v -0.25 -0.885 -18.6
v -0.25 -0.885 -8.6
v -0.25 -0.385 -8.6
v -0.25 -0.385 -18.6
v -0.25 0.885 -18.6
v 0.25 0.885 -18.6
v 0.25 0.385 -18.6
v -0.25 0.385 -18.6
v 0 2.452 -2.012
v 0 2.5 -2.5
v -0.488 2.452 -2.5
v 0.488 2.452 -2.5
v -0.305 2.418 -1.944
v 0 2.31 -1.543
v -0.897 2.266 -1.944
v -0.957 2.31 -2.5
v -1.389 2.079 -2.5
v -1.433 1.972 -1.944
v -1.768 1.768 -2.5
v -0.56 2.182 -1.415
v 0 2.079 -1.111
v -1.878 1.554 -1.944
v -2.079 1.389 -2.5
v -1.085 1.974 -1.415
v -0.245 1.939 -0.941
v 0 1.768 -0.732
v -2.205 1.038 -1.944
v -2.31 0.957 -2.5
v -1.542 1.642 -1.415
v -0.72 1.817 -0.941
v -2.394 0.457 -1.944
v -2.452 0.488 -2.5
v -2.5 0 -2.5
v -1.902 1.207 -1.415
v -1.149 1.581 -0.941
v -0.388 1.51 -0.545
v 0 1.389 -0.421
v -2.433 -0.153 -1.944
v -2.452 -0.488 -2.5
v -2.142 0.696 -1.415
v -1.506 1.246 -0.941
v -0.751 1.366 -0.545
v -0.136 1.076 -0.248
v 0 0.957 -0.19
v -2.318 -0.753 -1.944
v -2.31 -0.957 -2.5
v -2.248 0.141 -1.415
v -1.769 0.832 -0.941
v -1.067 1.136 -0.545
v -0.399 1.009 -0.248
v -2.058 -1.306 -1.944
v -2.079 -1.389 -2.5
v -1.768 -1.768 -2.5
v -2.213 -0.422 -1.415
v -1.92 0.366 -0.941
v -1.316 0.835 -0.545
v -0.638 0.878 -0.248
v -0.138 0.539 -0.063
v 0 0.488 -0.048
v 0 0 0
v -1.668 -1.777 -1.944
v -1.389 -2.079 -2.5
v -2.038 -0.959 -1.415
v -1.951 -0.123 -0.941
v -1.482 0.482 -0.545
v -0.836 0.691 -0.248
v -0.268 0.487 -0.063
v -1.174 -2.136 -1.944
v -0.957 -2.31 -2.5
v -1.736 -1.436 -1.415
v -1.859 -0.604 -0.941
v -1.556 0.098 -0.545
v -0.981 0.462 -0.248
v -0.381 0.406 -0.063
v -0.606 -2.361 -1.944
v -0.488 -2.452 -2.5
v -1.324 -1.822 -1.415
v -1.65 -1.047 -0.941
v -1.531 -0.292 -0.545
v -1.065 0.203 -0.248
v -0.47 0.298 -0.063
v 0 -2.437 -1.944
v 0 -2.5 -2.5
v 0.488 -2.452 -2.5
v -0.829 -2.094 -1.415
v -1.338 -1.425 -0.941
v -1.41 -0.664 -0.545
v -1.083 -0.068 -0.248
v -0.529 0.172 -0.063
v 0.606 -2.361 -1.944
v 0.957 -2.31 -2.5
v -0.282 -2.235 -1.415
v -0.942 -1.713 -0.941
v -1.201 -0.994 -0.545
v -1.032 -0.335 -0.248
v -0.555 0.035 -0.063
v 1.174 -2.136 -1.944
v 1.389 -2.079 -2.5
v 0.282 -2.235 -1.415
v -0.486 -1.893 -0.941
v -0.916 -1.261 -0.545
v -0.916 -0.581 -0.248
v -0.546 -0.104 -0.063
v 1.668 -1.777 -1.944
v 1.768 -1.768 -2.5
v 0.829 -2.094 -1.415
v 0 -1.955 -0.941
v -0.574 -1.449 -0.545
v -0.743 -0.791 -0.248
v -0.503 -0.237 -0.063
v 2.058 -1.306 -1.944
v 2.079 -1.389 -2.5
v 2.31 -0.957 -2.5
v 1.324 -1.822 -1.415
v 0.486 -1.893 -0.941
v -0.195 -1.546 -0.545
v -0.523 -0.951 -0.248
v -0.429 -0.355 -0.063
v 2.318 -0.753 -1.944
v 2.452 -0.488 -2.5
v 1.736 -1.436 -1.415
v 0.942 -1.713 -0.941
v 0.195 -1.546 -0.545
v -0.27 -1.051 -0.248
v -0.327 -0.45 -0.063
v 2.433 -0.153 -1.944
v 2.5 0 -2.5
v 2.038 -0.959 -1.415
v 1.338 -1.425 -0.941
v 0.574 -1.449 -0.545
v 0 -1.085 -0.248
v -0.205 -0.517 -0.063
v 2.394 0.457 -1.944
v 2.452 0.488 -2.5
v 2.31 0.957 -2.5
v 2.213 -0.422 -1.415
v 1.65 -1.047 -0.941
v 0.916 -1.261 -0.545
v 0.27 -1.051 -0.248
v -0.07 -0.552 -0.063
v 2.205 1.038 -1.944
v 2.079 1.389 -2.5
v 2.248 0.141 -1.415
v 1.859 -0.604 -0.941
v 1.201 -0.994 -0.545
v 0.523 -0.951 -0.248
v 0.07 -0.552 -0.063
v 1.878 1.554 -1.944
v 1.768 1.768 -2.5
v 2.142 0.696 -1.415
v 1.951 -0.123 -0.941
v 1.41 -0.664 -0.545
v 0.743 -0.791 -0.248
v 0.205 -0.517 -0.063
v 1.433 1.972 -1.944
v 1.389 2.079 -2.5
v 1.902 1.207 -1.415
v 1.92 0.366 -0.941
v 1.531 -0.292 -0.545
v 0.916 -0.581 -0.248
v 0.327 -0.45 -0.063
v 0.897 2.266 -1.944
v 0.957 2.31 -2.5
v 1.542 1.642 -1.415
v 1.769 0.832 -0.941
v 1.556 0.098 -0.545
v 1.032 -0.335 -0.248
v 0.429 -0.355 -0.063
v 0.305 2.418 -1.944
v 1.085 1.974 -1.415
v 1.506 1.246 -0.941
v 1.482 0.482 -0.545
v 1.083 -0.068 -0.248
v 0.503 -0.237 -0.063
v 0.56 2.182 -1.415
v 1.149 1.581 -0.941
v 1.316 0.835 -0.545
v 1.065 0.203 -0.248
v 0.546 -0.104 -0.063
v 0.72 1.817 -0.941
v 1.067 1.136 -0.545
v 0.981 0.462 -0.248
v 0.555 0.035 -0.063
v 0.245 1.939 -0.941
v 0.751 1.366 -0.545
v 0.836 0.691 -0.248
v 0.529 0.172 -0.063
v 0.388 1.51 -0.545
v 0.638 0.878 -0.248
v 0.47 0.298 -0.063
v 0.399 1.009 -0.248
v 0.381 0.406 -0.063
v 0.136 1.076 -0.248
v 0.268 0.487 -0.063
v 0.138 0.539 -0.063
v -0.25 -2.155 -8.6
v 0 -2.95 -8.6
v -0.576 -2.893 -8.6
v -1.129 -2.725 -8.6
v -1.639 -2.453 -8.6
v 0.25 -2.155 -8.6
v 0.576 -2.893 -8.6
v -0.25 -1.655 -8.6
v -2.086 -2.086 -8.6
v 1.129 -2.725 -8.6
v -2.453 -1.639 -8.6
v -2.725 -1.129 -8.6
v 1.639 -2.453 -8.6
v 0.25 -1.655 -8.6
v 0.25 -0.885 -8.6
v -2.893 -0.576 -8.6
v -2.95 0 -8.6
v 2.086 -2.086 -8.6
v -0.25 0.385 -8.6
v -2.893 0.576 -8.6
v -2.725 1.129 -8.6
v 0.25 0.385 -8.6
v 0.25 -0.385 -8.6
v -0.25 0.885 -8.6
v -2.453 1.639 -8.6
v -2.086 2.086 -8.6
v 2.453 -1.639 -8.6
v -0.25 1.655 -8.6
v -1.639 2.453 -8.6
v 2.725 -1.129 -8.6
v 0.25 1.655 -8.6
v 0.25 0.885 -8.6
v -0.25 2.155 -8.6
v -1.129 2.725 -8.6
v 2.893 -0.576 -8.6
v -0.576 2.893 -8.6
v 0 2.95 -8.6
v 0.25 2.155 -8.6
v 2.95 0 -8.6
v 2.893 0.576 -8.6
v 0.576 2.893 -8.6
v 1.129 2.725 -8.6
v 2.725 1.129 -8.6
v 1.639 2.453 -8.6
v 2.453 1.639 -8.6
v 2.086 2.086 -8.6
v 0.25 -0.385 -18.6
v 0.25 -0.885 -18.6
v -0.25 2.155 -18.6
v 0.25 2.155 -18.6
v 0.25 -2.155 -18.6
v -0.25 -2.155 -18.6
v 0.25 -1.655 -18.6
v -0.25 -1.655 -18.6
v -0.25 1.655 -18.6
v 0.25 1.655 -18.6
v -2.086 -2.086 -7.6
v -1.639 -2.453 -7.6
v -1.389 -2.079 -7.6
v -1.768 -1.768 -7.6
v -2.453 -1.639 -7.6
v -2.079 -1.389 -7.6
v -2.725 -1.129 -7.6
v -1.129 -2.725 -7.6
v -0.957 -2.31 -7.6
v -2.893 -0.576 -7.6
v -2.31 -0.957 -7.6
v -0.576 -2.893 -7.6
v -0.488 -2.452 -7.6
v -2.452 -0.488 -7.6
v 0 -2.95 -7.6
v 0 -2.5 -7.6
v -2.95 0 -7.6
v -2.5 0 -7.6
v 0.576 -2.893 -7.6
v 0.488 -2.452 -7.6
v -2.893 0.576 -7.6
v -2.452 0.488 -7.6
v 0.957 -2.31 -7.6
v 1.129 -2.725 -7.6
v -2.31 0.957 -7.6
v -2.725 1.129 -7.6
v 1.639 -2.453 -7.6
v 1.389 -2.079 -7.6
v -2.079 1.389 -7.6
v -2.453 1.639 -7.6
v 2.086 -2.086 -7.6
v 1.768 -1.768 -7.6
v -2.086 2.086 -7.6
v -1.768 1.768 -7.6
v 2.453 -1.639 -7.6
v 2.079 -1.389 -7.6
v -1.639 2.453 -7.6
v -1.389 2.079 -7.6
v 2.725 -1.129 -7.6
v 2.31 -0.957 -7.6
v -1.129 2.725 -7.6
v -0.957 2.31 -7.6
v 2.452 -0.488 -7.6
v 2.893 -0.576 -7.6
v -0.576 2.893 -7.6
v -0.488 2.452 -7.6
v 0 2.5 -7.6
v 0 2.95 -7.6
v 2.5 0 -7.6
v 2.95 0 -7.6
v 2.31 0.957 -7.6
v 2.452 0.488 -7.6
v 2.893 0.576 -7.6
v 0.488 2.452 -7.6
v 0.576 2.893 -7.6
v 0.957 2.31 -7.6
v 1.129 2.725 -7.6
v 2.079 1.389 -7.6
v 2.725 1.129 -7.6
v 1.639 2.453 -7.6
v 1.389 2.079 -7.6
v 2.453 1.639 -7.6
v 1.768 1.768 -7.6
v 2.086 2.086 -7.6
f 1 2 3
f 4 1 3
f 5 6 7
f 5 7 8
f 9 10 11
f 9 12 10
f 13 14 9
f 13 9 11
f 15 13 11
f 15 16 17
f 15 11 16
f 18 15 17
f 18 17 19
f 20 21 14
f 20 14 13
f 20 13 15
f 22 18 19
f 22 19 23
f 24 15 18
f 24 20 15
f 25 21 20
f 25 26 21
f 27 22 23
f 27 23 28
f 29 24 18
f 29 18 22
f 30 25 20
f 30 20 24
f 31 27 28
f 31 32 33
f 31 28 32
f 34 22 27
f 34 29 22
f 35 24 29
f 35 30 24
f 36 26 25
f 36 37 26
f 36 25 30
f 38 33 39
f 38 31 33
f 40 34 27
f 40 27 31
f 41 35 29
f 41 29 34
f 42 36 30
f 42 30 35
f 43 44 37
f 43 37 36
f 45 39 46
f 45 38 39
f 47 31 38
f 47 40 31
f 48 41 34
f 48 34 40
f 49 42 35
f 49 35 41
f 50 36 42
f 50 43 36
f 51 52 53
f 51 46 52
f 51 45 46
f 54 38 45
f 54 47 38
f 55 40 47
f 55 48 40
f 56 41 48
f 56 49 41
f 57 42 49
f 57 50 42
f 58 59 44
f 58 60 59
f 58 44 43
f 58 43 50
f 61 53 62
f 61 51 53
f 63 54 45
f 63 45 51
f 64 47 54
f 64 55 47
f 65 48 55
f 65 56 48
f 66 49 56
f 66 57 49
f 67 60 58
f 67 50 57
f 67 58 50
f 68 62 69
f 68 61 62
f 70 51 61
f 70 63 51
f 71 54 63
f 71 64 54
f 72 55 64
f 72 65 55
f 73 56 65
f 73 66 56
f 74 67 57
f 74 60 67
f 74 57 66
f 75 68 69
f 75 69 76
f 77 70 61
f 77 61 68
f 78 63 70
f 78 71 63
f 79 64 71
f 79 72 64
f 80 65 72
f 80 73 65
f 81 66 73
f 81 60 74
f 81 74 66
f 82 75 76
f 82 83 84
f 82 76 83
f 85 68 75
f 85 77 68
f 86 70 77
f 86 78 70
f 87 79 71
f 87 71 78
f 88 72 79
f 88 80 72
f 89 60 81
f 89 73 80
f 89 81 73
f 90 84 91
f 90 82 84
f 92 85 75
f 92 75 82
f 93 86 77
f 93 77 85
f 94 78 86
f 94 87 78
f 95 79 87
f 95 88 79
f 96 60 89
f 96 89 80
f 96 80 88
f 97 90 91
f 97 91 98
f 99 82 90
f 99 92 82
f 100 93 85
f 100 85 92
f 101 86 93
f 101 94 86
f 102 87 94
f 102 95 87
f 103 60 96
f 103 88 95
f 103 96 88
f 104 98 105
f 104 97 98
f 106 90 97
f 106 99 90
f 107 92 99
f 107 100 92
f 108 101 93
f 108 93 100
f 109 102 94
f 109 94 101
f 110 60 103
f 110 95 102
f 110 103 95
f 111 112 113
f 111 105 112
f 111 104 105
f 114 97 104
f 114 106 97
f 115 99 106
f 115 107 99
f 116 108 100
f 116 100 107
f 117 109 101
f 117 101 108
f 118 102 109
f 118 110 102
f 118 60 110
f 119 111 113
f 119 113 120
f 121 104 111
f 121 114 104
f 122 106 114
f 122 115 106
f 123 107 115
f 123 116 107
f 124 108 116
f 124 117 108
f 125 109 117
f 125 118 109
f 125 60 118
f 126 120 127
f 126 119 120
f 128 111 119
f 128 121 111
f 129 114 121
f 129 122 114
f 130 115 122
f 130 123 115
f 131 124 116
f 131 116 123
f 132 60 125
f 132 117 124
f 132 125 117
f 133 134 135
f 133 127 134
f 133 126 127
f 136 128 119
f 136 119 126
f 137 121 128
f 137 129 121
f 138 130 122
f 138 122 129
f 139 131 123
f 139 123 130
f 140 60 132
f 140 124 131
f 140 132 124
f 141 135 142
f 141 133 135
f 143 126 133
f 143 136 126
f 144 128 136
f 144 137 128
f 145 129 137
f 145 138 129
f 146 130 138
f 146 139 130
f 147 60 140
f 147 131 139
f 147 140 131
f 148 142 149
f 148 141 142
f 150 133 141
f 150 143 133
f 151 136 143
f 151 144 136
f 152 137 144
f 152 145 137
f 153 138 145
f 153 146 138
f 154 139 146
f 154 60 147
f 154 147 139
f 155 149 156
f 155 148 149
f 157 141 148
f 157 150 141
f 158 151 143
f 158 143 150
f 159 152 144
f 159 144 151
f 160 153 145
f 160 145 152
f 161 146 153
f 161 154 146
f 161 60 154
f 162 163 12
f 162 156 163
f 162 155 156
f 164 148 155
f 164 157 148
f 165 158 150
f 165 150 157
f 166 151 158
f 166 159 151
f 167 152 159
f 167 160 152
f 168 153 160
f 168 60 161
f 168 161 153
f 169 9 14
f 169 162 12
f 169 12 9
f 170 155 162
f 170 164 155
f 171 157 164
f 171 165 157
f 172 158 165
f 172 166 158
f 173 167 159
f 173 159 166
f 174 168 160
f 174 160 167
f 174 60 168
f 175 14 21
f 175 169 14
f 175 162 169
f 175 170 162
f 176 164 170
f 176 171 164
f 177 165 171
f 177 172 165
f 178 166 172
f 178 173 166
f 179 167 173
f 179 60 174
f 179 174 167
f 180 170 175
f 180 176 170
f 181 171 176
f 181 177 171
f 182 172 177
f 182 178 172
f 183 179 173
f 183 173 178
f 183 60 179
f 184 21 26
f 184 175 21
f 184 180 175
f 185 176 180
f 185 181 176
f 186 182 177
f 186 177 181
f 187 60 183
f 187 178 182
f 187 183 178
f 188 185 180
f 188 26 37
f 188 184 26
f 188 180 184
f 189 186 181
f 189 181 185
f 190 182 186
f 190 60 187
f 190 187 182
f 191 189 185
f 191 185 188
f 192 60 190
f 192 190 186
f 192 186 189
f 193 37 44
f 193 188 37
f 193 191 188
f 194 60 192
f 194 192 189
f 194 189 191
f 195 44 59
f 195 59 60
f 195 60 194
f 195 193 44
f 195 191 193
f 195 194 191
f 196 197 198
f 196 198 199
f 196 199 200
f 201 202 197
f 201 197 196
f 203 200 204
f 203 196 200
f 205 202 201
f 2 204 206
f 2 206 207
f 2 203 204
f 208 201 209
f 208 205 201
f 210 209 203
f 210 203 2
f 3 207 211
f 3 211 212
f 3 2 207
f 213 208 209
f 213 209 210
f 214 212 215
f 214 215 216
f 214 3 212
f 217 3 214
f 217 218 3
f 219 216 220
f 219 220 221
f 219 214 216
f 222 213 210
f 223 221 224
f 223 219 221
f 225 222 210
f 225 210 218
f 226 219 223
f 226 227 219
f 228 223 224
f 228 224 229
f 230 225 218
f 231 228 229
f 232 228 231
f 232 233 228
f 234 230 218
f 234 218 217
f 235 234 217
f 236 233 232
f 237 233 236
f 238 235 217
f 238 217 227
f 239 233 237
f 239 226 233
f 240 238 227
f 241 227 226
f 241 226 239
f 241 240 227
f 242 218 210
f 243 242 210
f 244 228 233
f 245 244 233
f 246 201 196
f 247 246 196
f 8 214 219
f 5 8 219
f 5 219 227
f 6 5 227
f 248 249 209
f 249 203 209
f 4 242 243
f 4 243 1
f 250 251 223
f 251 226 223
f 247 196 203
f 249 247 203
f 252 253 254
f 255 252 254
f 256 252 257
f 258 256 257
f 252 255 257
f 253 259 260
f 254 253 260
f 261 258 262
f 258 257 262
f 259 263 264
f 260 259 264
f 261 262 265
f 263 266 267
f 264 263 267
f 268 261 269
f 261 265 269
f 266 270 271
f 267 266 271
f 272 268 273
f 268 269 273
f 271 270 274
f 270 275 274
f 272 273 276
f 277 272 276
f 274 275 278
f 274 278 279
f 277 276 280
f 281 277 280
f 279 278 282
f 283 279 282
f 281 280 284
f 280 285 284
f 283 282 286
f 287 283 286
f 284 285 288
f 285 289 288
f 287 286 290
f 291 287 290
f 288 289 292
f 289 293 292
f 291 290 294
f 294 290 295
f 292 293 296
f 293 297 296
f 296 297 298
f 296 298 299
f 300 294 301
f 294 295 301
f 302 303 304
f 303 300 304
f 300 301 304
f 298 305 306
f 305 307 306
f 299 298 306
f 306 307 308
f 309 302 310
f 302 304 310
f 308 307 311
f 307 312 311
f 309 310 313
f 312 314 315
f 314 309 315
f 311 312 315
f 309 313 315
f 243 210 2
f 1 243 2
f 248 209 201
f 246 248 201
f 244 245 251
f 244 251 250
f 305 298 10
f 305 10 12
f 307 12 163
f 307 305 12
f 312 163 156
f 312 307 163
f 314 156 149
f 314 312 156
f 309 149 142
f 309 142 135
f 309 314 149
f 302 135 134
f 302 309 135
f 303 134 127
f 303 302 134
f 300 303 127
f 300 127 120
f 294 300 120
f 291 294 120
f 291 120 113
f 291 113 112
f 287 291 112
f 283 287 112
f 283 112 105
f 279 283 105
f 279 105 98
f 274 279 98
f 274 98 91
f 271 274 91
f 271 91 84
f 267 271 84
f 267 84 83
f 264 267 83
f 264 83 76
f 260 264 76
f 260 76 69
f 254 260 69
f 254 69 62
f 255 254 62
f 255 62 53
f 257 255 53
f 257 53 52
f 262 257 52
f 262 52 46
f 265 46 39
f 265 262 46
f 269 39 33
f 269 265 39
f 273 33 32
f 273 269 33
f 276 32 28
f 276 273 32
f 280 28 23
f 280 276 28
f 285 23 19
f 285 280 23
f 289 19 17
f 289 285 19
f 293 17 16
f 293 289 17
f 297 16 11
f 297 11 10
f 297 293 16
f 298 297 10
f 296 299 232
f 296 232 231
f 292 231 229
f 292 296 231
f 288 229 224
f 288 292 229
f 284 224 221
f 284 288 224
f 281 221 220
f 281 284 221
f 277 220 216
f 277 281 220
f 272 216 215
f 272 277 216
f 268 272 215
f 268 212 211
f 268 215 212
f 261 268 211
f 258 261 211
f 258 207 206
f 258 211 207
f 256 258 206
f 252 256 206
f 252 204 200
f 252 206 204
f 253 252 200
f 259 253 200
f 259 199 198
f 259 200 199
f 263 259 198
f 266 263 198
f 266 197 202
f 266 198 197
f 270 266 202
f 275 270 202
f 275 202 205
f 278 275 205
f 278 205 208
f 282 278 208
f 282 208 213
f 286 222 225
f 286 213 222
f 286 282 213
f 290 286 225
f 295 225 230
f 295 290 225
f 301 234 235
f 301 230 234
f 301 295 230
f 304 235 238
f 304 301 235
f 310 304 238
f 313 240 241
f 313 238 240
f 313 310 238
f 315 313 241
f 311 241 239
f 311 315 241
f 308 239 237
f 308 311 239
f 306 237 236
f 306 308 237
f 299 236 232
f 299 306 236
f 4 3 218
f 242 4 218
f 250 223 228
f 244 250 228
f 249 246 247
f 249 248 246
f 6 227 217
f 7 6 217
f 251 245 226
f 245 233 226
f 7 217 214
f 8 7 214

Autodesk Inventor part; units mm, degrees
ref_plane "YZ Plane" through (0, 0, 0) normal (1, 0, 0) x (0, 1, 0)
ref_plane "XZ Plane" through (0, 0, 0) normal (0, 1, 0) x (-1, 0, 0)
ref_plane "XY Plane" through (0, 0, 0) normal (0, 0, 1) x (1, 0, 0)
sketch "스케치1" plane through (0, 0, 0) normal (1, 0, 0) x (0, 1, 0)
  line L0 (0, 0) -> (0, -8.6)
  line L1 (0, -8.6) -> (0, -25.7335)
  arc A0 (2.5, -2.5) -> (0, 0) centre (0, -2.5) ccw
  line L2 (2.5, -2.5) -> (2.5, -7.6)
  line L3 (0, -8.6) -> (2.95, -8.6)
  line L4 (2.95, -8.6) -> (2.95, -7.6)
  line L5 (2.95, -7.6) -> (2.5, -7.6)
  dimension "d0" = 8.6
  dimension "d1" = 17.1335
  dimension "d2" = 5
  dimension "d3" = 1
  dimension "d4" = 2.5
  dimension "d6" = 5.9
revolve "회전1" add sketch "스케치1" angle 360 about axis through (0, 0, -8.6) along (0, 0, -1)
sketch "스케치2" plane through (0, 0, -8.6) normal (0, 0, -1) x (-1, 0, 0)
  line L0 (0.25, -1.655) -> (-0.25, -1.655)
  line L1 (-0.25, -1.655) -> (-0.25, -2.155)
  line L2 (-0.25, -2.155) -> (0.25, -2.155)
  line L3 (0.25, -2.155) -> (0.25, -1.655)
  line L4 (0.25, -1.655) -> (-0.25, -2.155) construction
  line L5 (-0.25, -1.655) -> (0.25, -2.155) construction
  line L6 (0.25, -0.385) -> (-0.25, -0.385)
  line L7 (-0.25, -0.385) -> (-0.25, -0.885)
  line L8 (-0.25, -0.885) -> (0.25, -0.885)
  line L9 (0.25, -0.885) -> (0.25, -0.385)
  line L10 (0.25, -0.385) -> (-0.25, -0.885) construction
  line L11 (-0.25, -0.385) -> (0.25, -0.885) construction
  line L12 (0.25, 0.885) -> (-0.25, 0.885)
  line L13 (-0.25, 0.885) -> (-0.25, 0.385)
  line L14 (-0.25, 0.385) -> (0.25, 0.385)
  line L15 (0.25, 0.385) -> (0.25, 0.885)
  line L16 (0.25, 0.885) -> (-0.25, 0.385) construction
  line L17 (-0.25, 0.885) -> (0.25, 0.385) construction
  line L18 (0.25, 2.155) -> (-0.25, 2.155)
  line L19 (-0.25, 2.155) -> (-0.25, 1.655)
  line L20 (-0.25, 1.655) -> (0.25, 1.655)
  line L21 (0.25, 1.655) -> (0.25, 2.155)
  line L22 (0.25, 2.155) -> (-0.25, 1.655) construction
  line L23 (-0.25, 2.155) -> (0.25, 1.655) construction
  line L24 (0, -1.905) -> (0, 1.905) construction
  point P0 (0, 0)
  point P1 (0, -0.635)
  point P2 (0, 0.635)
  point P3 (0, 0)
  point P4 (0, 0)
  dimension "d8" = 0.5
  dimension "d9" = 0.5
  dimension "d10" = 0.5
  dimension "d11" = 0.5
  dimension "d12" = 0.5
  dimension "d13" = 0.5
  dimension "d14" = 0.5
  dimension "d15" = 0.5
  dimension "d16" = 1.27
  dimension "d17" = 1.27
  dimension "d18" = 1.27
extrude "돌출1" add sketch "스케치2" along normal blind 10
equation "\"d17\" = d16"
equation "\"d18\" = d17"
properties part number "led"
